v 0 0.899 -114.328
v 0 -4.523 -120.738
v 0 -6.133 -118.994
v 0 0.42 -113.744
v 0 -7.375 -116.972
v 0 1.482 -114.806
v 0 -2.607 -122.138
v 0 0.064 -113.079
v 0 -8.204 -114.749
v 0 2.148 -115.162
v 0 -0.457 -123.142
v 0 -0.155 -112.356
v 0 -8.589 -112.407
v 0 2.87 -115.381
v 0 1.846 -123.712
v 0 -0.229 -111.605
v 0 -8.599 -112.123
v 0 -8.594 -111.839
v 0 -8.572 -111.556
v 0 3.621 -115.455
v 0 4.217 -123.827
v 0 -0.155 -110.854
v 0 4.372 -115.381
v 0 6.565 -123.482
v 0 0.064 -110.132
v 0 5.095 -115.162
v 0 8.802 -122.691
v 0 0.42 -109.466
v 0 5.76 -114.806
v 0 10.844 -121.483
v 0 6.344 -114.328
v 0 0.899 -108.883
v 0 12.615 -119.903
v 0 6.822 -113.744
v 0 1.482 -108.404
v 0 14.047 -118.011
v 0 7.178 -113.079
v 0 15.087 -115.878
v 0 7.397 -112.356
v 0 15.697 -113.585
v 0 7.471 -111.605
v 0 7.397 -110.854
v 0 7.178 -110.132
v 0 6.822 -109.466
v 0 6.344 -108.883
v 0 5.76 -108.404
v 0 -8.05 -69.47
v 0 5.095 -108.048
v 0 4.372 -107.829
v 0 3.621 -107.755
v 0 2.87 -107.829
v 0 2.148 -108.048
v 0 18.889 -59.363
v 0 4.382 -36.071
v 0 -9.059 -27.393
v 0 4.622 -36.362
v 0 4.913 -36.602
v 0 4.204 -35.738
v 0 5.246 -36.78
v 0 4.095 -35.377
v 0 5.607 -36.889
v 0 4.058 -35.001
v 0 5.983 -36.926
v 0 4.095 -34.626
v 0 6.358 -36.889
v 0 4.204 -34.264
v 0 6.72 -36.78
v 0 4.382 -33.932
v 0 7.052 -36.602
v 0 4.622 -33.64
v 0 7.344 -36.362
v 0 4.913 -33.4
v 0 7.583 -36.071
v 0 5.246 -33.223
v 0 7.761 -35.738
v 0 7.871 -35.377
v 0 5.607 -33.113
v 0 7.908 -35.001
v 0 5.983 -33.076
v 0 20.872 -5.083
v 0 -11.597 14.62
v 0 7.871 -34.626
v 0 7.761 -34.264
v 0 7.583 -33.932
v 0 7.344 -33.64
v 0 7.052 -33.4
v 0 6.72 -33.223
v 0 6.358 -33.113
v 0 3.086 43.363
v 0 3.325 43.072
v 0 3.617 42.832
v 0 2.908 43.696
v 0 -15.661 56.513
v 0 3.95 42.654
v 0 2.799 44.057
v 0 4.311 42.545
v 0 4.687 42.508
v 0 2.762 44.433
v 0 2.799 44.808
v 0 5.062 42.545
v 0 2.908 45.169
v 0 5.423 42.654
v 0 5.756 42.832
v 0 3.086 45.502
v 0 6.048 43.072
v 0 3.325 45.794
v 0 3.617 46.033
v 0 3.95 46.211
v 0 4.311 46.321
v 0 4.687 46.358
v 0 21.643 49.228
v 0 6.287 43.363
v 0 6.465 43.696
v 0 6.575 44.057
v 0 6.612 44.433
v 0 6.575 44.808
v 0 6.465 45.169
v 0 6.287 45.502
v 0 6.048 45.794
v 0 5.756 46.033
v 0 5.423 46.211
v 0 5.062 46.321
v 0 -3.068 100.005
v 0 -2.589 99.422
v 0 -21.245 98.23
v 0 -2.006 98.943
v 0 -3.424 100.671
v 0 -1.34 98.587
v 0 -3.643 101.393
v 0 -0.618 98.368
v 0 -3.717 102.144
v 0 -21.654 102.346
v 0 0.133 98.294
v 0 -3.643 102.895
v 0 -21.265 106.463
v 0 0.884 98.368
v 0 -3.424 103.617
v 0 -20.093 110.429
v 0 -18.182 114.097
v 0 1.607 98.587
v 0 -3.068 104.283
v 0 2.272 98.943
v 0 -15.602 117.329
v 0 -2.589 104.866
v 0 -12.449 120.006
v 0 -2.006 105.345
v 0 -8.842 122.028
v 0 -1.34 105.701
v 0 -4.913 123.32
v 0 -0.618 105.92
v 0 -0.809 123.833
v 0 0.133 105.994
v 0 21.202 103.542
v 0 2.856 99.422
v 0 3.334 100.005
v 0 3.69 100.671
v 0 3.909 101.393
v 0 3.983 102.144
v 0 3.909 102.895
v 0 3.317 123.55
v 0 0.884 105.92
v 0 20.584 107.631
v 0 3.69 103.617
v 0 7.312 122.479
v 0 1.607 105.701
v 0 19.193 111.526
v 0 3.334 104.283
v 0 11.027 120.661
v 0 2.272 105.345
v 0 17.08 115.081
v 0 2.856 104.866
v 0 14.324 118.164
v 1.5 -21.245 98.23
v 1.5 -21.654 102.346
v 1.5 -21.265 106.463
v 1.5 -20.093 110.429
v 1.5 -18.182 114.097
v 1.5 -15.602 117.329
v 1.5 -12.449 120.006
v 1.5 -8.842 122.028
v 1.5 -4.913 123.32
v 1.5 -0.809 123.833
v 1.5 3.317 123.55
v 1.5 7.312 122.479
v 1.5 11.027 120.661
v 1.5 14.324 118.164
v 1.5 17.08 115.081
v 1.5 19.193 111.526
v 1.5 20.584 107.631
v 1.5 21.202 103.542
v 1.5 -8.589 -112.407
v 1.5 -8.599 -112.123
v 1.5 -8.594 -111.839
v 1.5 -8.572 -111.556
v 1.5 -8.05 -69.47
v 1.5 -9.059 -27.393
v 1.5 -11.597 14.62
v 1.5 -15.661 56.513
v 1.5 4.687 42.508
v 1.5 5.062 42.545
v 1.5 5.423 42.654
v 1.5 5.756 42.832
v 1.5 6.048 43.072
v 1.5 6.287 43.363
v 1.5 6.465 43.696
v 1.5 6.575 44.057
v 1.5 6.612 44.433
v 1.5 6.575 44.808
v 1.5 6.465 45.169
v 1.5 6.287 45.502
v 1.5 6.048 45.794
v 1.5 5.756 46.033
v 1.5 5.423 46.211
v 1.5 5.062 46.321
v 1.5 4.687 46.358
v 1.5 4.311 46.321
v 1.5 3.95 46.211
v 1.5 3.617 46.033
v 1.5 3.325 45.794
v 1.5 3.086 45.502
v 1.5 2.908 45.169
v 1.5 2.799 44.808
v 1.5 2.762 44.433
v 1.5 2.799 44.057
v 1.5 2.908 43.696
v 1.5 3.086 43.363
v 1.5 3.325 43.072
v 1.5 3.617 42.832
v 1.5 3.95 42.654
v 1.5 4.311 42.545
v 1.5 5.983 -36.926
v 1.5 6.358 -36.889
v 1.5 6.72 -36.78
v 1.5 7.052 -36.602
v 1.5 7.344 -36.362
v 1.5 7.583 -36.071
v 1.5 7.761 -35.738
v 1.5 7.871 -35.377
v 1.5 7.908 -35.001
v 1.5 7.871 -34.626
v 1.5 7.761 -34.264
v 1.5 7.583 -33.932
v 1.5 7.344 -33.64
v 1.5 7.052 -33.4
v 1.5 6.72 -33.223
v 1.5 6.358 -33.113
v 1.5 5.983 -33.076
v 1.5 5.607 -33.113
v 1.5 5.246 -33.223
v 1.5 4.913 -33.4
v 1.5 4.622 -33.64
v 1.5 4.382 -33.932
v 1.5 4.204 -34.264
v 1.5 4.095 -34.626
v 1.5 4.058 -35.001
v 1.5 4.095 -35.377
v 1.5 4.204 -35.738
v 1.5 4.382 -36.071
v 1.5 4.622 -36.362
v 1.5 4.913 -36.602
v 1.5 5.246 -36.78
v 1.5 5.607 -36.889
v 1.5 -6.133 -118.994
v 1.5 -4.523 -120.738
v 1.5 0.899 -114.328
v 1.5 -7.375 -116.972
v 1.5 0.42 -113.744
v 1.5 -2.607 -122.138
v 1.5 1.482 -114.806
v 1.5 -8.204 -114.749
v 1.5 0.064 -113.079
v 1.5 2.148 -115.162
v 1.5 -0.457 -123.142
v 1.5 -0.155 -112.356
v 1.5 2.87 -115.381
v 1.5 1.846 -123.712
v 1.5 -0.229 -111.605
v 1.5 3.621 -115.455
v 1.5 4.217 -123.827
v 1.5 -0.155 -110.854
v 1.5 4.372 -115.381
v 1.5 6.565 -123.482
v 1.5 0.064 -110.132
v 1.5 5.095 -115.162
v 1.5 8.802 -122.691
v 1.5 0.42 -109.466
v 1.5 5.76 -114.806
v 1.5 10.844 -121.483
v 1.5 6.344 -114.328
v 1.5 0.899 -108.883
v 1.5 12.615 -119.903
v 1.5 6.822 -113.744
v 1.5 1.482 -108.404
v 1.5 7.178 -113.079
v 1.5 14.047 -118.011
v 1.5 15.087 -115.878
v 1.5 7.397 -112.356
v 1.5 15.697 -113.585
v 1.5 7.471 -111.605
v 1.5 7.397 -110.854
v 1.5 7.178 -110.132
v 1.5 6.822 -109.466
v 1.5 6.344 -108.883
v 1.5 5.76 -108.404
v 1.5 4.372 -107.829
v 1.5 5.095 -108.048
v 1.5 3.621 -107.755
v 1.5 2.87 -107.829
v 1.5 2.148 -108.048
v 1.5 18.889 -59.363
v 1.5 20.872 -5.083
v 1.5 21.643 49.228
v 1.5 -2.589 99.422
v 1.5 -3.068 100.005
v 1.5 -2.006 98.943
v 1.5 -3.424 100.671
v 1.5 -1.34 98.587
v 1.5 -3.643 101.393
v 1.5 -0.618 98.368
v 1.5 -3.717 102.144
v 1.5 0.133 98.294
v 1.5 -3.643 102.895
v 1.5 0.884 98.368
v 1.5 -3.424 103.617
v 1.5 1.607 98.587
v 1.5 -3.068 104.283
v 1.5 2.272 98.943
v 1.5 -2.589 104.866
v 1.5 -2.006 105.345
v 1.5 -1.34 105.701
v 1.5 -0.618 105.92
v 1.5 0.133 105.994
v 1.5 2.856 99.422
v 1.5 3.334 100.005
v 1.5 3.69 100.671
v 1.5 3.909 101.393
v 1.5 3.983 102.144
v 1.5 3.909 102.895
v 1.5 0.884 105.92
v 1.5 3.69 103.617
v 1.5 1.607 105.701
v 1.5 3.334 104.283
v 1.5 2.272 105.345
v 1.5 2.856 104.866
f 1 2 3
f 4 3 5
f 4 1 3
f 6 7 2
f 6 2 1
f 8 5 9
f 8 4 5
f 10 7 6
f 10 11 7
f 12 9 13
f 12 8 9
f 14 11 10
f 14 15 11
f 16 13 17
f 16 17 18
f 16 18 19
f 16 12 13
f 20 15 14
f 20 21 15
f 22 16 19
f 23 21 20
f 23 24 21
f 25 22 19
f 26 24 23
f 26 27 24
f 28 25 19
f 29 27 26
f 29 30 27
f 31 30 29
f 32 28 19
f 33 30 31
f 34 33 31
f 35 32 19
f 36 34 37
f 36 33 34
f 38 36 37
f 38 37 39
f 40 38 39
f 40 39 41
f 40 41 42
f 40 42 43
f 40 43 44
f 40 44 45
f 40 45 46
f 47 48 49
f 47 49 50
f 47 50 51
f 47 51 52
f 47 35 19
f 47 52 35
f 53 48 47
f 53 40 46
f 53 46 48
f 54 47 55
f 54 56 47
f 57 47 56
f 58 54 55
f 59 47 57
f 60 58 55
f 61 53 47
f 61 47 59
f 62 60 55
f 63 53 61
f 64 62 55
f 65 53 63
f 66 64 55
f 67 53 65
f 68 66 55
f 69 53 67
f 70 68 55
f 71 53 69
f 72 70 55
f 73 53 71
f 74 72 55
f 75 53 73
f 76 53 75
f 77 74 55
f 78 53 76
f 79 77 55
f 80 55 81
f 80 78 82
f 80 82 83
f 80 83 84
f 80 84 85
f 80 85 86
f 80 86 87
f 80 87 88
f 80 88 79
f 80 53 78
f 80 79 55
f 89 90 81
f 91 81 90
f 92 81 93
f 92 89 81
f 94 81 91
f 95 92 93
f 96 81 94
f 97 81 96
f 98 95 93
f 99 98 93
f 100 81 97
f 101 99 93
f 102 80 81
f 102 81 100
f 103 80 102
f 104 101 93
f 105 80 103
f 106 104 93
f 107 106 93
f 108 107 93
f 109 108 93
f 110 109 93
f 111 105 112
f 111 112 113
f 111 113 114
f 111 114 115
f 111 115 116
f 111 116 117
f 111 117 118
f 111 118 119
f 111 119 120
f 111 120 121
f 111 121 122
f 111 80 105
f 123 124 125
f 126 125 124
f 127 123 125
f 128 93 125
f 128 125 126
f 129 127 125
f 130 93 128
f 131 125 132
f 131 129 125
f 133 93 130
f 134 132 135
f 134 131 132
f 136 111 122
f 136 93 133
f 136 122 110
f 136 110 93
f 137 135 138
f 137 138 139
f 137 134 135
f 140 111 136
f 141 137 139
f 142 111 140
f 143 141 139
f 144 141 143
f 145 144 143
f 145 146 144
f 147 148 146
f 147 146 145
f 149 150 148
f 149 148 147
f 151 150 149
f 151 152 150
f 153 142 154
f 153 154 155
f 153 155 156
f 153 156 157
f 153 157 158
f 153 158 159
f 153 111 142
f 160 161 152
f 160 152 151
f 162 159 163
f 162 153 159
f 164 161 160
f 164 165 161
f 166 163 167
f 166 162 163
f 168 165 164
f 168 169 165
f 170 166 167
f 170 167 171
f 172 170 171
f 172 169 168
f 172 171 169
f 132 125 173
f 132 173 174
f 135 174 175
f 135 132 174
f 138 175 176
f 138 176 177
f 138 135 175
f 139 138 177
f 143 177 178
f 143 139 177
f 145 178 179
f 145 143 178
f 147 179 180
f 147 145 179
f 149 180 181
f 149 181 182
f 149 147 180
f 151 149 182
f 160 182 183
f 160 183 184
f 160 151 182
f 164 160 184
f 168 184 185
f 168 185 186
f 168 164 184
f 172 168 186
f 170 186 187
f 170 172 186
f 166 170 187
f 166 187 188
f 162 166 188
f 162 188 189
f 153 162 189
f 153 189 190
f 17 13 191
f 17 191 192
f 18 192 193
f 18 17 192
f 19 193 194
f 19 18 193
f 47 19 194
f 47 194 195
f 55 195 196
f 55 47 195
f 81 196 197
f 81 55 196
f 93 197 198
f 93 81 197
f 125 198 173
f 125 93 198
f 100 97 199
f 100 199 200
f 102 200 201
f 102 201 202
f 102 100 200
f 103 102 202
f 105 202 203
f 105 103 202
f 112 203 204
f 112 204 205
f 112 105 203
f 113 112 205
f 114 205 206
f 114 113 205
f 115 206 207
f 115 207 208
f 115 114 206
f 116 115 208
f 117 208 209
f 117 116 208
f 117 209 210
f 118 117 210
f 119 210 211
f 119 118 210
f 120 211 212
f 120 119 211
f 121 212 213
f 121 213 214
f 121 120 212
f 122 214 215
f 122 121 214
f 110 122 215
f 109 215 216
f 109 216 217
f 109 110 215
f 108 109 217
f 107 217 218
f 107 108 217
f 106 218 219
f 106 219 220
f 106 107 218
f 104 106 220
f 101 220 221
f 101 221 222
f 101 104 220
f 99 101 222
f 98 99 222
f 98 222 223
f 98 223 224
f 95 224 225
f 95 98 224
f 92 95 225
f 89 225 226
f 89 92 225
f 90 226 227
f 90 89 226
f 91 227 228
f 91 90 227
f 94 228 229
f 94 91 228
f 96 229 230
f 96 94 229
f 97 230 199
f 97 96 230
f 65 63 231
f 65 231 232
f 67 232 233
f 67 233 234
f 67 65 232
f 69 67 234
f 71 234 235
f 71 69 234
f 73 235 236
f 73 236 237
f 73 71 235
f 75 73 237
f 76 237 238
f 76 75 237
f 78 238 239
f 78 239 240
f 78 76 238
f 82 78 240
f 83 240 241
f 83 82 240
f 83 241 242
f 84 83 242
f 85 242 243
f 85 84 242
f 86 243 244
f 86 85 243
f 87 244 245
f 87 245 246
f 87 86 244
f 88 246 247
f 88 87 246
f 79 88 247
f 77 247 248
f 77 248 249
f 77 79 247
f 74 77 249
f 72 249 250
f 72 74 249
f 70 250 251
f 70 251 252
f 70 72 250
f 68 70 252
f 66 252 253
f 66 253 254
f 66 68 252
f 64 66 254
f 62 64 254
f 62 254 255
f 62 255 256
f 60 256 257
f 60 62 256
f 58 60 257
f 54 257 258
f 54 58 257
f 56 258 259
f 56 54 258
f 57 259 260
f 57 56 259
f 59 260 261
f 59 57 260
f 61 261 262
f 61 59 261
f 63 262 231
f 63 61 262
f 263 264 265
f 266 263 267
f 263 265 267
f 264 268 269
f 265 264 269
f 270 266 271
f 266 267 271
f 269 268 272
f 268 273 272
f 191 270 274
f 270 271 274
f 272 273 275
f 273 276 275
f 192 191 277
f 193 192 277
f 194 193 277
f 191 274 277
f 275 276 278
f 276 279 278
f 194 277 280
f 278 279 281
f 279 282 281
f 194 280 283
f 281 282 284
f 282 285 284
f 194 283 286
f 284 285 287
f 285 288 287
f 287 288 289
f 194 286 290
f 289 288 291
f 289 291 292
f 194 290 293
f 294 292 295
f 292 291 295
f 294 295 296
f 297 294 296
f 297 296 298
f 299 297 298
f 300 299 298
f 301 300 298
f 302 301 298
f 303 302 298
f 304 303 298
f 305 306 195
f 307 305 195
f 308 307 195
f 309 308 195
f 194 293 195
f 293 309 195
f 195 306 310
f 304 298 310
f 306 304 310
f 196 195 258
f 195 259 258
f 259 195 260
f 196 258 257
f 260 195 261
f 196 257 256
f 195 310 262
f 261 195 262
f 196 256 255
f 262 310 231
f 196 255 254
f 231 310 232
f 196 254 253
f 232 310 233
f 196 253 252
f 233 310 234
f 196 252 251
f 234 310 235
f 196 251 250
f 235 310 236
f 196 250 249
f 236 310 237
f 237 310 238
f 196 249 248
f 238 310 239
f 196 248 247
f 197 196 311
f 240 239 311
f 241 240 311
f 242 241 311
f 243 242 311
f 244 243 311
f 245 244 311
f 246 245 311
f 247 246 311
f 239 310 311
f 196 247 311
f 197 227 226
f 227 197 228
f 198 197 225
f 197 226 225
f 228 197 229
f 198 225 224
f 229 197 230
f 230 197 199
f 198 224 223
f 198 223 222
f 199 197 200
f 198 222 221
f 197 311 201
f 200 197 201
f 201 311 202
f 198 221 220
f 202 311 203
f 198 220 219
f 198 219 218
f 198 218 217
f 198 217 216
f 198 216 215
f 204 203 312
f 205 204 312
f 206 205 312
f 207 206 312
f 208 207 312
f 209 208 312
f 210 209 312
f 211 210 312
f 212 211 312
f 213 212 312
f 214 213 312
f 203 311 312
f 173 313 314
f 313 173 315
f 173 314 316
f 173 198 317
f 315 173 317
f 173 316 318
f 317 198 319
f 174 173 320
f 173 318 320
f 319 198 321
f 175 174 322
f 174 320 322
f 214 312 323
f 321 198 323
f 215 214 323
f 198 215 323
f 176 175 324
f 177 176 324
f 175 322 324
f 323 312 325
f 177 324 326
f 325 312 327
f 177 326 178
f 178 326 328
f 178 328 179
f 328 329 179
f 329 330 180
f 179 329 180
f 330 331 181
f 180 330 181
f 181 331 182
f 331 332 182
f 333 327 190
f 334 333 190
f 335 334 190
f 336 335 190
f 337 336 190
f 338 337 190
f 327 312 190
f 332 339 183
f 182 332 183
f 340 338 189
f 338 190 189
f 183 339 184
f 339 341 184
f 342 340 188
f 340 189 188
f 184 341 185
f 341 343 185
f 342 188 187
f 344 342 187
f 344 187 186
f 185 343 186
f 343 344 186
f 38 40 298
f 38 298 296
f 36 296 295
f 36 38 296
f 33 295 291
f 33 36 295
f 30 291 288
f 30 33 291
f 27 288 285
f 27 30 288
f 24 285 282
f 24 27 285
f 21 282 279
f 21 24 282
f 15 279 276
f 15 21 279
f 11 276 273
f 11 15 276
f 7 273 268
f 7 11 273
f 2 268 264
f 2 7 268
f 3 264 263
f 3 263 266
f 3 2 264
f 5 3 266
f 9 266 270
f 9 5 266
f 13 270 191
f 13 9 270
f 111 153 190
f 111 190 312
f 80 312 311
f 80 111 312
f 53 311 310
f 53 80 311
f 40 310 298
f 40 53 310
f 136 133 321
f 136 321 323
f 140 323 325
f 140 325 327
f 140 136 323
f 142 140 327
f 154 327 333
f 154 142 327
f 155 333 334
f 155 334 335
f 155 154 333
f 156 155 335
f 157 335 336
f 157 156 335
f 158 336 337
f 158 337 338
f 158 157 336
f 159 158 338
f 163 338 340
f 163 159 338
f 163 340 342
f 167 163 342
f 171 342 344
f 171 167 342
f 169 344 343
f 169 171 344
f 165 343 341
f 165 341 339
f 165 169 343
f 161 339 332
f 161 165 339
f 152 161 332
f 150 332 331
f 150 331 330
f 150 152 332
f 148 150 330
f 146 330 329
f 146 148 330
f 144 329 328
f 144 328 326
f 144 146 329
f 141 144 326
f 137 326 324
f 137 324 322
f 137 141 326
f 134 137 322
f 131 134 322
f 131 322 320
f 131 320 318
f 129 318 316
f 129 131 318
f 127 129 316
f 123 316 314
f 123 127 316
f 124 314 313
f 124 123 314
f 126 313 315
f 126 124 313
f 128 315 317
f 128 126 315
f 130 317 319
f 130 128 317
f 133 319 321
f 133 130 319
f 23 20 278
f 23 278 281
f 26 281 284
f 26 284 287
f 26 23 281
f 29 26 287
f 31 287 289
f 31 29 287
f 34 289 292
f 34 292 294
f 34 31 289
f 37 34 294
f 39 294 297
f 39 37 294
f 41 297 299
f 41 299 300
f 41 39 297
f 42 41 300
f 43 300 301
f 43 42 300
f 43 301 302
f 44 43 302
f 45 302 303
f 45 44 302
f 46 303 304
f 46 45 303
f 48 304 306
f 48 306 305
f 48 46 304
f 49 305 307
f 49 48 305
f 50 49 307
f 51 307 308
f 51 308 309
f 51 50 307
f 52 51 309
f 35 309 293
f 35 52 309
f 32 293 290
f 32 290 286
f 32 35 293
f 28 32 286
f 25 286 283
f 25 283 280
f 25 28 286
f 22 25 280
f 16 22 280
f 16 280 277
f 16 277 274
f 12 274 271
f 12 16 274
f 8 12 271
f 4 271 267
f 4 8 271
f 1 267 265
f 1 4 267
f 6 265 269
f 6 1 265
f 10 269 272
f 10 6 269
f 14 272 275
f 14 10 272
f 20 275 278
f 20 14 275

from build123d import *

# Parameters (mm, degrees)
SKETCH_1_R      = 3.85
SKETCH_1_R_2    = 1.925
EXTRUDE_1_DEPTH = 1.5


with BuildPart() as part:
    # 草圖1 → 填料-伸長1 (new body)
    with BuildSketch(Plane(origin=(0, 0, 0), x_dir=(0, 0, -1), z_dir=(1, 0, 0))):
        with BuildLine():
            ThreePointArc((111.555989952, -8.572011863), (6.374730125, -10.137132711), (-98.230068302, -21.244930328))
            ThreePointArc((-98.230068302, -21.244930328), (-123.67575498, -2.873316644), (-103.541794939, 21.20204032))
            ThreePointArc((-103.541794939, 21.20204032), (5.082777822, 20.871677912), (113.584507189, 15.696576829))
            ThreePointArc((113.584507189, 15.696576829), (123.827345593, 3.028727453), (112.406990492, -8.588743688))
            ThreePointArc((112.406990492, -8.588743688), (111.981133536, -8.59851924), (111.555989952, -8.572011863))
        make_face()
        with Locations((-102.143981395, 0.133331517)):
            Circle(SKETCH_1_R, mode=Mode.SUBTRACT)
        with Locations((35.001055541, 5.982881827)):
            Circle(SKETCH_1_R_2, mode=Mode.SUBTRACT)
        with Locations((-44.432813653, 4.686665047)):
            Circle(SKETCH_1_R_2, mode=Mode.SUBTRACT)
        with Locations((111.605339346, 3.621333032)):
            Circle(SKETCH_1_R, mode=Mode.SUBTRACT)
    extrude(amount=EXTRUDE_1_DEPTH)


solid = part.part
